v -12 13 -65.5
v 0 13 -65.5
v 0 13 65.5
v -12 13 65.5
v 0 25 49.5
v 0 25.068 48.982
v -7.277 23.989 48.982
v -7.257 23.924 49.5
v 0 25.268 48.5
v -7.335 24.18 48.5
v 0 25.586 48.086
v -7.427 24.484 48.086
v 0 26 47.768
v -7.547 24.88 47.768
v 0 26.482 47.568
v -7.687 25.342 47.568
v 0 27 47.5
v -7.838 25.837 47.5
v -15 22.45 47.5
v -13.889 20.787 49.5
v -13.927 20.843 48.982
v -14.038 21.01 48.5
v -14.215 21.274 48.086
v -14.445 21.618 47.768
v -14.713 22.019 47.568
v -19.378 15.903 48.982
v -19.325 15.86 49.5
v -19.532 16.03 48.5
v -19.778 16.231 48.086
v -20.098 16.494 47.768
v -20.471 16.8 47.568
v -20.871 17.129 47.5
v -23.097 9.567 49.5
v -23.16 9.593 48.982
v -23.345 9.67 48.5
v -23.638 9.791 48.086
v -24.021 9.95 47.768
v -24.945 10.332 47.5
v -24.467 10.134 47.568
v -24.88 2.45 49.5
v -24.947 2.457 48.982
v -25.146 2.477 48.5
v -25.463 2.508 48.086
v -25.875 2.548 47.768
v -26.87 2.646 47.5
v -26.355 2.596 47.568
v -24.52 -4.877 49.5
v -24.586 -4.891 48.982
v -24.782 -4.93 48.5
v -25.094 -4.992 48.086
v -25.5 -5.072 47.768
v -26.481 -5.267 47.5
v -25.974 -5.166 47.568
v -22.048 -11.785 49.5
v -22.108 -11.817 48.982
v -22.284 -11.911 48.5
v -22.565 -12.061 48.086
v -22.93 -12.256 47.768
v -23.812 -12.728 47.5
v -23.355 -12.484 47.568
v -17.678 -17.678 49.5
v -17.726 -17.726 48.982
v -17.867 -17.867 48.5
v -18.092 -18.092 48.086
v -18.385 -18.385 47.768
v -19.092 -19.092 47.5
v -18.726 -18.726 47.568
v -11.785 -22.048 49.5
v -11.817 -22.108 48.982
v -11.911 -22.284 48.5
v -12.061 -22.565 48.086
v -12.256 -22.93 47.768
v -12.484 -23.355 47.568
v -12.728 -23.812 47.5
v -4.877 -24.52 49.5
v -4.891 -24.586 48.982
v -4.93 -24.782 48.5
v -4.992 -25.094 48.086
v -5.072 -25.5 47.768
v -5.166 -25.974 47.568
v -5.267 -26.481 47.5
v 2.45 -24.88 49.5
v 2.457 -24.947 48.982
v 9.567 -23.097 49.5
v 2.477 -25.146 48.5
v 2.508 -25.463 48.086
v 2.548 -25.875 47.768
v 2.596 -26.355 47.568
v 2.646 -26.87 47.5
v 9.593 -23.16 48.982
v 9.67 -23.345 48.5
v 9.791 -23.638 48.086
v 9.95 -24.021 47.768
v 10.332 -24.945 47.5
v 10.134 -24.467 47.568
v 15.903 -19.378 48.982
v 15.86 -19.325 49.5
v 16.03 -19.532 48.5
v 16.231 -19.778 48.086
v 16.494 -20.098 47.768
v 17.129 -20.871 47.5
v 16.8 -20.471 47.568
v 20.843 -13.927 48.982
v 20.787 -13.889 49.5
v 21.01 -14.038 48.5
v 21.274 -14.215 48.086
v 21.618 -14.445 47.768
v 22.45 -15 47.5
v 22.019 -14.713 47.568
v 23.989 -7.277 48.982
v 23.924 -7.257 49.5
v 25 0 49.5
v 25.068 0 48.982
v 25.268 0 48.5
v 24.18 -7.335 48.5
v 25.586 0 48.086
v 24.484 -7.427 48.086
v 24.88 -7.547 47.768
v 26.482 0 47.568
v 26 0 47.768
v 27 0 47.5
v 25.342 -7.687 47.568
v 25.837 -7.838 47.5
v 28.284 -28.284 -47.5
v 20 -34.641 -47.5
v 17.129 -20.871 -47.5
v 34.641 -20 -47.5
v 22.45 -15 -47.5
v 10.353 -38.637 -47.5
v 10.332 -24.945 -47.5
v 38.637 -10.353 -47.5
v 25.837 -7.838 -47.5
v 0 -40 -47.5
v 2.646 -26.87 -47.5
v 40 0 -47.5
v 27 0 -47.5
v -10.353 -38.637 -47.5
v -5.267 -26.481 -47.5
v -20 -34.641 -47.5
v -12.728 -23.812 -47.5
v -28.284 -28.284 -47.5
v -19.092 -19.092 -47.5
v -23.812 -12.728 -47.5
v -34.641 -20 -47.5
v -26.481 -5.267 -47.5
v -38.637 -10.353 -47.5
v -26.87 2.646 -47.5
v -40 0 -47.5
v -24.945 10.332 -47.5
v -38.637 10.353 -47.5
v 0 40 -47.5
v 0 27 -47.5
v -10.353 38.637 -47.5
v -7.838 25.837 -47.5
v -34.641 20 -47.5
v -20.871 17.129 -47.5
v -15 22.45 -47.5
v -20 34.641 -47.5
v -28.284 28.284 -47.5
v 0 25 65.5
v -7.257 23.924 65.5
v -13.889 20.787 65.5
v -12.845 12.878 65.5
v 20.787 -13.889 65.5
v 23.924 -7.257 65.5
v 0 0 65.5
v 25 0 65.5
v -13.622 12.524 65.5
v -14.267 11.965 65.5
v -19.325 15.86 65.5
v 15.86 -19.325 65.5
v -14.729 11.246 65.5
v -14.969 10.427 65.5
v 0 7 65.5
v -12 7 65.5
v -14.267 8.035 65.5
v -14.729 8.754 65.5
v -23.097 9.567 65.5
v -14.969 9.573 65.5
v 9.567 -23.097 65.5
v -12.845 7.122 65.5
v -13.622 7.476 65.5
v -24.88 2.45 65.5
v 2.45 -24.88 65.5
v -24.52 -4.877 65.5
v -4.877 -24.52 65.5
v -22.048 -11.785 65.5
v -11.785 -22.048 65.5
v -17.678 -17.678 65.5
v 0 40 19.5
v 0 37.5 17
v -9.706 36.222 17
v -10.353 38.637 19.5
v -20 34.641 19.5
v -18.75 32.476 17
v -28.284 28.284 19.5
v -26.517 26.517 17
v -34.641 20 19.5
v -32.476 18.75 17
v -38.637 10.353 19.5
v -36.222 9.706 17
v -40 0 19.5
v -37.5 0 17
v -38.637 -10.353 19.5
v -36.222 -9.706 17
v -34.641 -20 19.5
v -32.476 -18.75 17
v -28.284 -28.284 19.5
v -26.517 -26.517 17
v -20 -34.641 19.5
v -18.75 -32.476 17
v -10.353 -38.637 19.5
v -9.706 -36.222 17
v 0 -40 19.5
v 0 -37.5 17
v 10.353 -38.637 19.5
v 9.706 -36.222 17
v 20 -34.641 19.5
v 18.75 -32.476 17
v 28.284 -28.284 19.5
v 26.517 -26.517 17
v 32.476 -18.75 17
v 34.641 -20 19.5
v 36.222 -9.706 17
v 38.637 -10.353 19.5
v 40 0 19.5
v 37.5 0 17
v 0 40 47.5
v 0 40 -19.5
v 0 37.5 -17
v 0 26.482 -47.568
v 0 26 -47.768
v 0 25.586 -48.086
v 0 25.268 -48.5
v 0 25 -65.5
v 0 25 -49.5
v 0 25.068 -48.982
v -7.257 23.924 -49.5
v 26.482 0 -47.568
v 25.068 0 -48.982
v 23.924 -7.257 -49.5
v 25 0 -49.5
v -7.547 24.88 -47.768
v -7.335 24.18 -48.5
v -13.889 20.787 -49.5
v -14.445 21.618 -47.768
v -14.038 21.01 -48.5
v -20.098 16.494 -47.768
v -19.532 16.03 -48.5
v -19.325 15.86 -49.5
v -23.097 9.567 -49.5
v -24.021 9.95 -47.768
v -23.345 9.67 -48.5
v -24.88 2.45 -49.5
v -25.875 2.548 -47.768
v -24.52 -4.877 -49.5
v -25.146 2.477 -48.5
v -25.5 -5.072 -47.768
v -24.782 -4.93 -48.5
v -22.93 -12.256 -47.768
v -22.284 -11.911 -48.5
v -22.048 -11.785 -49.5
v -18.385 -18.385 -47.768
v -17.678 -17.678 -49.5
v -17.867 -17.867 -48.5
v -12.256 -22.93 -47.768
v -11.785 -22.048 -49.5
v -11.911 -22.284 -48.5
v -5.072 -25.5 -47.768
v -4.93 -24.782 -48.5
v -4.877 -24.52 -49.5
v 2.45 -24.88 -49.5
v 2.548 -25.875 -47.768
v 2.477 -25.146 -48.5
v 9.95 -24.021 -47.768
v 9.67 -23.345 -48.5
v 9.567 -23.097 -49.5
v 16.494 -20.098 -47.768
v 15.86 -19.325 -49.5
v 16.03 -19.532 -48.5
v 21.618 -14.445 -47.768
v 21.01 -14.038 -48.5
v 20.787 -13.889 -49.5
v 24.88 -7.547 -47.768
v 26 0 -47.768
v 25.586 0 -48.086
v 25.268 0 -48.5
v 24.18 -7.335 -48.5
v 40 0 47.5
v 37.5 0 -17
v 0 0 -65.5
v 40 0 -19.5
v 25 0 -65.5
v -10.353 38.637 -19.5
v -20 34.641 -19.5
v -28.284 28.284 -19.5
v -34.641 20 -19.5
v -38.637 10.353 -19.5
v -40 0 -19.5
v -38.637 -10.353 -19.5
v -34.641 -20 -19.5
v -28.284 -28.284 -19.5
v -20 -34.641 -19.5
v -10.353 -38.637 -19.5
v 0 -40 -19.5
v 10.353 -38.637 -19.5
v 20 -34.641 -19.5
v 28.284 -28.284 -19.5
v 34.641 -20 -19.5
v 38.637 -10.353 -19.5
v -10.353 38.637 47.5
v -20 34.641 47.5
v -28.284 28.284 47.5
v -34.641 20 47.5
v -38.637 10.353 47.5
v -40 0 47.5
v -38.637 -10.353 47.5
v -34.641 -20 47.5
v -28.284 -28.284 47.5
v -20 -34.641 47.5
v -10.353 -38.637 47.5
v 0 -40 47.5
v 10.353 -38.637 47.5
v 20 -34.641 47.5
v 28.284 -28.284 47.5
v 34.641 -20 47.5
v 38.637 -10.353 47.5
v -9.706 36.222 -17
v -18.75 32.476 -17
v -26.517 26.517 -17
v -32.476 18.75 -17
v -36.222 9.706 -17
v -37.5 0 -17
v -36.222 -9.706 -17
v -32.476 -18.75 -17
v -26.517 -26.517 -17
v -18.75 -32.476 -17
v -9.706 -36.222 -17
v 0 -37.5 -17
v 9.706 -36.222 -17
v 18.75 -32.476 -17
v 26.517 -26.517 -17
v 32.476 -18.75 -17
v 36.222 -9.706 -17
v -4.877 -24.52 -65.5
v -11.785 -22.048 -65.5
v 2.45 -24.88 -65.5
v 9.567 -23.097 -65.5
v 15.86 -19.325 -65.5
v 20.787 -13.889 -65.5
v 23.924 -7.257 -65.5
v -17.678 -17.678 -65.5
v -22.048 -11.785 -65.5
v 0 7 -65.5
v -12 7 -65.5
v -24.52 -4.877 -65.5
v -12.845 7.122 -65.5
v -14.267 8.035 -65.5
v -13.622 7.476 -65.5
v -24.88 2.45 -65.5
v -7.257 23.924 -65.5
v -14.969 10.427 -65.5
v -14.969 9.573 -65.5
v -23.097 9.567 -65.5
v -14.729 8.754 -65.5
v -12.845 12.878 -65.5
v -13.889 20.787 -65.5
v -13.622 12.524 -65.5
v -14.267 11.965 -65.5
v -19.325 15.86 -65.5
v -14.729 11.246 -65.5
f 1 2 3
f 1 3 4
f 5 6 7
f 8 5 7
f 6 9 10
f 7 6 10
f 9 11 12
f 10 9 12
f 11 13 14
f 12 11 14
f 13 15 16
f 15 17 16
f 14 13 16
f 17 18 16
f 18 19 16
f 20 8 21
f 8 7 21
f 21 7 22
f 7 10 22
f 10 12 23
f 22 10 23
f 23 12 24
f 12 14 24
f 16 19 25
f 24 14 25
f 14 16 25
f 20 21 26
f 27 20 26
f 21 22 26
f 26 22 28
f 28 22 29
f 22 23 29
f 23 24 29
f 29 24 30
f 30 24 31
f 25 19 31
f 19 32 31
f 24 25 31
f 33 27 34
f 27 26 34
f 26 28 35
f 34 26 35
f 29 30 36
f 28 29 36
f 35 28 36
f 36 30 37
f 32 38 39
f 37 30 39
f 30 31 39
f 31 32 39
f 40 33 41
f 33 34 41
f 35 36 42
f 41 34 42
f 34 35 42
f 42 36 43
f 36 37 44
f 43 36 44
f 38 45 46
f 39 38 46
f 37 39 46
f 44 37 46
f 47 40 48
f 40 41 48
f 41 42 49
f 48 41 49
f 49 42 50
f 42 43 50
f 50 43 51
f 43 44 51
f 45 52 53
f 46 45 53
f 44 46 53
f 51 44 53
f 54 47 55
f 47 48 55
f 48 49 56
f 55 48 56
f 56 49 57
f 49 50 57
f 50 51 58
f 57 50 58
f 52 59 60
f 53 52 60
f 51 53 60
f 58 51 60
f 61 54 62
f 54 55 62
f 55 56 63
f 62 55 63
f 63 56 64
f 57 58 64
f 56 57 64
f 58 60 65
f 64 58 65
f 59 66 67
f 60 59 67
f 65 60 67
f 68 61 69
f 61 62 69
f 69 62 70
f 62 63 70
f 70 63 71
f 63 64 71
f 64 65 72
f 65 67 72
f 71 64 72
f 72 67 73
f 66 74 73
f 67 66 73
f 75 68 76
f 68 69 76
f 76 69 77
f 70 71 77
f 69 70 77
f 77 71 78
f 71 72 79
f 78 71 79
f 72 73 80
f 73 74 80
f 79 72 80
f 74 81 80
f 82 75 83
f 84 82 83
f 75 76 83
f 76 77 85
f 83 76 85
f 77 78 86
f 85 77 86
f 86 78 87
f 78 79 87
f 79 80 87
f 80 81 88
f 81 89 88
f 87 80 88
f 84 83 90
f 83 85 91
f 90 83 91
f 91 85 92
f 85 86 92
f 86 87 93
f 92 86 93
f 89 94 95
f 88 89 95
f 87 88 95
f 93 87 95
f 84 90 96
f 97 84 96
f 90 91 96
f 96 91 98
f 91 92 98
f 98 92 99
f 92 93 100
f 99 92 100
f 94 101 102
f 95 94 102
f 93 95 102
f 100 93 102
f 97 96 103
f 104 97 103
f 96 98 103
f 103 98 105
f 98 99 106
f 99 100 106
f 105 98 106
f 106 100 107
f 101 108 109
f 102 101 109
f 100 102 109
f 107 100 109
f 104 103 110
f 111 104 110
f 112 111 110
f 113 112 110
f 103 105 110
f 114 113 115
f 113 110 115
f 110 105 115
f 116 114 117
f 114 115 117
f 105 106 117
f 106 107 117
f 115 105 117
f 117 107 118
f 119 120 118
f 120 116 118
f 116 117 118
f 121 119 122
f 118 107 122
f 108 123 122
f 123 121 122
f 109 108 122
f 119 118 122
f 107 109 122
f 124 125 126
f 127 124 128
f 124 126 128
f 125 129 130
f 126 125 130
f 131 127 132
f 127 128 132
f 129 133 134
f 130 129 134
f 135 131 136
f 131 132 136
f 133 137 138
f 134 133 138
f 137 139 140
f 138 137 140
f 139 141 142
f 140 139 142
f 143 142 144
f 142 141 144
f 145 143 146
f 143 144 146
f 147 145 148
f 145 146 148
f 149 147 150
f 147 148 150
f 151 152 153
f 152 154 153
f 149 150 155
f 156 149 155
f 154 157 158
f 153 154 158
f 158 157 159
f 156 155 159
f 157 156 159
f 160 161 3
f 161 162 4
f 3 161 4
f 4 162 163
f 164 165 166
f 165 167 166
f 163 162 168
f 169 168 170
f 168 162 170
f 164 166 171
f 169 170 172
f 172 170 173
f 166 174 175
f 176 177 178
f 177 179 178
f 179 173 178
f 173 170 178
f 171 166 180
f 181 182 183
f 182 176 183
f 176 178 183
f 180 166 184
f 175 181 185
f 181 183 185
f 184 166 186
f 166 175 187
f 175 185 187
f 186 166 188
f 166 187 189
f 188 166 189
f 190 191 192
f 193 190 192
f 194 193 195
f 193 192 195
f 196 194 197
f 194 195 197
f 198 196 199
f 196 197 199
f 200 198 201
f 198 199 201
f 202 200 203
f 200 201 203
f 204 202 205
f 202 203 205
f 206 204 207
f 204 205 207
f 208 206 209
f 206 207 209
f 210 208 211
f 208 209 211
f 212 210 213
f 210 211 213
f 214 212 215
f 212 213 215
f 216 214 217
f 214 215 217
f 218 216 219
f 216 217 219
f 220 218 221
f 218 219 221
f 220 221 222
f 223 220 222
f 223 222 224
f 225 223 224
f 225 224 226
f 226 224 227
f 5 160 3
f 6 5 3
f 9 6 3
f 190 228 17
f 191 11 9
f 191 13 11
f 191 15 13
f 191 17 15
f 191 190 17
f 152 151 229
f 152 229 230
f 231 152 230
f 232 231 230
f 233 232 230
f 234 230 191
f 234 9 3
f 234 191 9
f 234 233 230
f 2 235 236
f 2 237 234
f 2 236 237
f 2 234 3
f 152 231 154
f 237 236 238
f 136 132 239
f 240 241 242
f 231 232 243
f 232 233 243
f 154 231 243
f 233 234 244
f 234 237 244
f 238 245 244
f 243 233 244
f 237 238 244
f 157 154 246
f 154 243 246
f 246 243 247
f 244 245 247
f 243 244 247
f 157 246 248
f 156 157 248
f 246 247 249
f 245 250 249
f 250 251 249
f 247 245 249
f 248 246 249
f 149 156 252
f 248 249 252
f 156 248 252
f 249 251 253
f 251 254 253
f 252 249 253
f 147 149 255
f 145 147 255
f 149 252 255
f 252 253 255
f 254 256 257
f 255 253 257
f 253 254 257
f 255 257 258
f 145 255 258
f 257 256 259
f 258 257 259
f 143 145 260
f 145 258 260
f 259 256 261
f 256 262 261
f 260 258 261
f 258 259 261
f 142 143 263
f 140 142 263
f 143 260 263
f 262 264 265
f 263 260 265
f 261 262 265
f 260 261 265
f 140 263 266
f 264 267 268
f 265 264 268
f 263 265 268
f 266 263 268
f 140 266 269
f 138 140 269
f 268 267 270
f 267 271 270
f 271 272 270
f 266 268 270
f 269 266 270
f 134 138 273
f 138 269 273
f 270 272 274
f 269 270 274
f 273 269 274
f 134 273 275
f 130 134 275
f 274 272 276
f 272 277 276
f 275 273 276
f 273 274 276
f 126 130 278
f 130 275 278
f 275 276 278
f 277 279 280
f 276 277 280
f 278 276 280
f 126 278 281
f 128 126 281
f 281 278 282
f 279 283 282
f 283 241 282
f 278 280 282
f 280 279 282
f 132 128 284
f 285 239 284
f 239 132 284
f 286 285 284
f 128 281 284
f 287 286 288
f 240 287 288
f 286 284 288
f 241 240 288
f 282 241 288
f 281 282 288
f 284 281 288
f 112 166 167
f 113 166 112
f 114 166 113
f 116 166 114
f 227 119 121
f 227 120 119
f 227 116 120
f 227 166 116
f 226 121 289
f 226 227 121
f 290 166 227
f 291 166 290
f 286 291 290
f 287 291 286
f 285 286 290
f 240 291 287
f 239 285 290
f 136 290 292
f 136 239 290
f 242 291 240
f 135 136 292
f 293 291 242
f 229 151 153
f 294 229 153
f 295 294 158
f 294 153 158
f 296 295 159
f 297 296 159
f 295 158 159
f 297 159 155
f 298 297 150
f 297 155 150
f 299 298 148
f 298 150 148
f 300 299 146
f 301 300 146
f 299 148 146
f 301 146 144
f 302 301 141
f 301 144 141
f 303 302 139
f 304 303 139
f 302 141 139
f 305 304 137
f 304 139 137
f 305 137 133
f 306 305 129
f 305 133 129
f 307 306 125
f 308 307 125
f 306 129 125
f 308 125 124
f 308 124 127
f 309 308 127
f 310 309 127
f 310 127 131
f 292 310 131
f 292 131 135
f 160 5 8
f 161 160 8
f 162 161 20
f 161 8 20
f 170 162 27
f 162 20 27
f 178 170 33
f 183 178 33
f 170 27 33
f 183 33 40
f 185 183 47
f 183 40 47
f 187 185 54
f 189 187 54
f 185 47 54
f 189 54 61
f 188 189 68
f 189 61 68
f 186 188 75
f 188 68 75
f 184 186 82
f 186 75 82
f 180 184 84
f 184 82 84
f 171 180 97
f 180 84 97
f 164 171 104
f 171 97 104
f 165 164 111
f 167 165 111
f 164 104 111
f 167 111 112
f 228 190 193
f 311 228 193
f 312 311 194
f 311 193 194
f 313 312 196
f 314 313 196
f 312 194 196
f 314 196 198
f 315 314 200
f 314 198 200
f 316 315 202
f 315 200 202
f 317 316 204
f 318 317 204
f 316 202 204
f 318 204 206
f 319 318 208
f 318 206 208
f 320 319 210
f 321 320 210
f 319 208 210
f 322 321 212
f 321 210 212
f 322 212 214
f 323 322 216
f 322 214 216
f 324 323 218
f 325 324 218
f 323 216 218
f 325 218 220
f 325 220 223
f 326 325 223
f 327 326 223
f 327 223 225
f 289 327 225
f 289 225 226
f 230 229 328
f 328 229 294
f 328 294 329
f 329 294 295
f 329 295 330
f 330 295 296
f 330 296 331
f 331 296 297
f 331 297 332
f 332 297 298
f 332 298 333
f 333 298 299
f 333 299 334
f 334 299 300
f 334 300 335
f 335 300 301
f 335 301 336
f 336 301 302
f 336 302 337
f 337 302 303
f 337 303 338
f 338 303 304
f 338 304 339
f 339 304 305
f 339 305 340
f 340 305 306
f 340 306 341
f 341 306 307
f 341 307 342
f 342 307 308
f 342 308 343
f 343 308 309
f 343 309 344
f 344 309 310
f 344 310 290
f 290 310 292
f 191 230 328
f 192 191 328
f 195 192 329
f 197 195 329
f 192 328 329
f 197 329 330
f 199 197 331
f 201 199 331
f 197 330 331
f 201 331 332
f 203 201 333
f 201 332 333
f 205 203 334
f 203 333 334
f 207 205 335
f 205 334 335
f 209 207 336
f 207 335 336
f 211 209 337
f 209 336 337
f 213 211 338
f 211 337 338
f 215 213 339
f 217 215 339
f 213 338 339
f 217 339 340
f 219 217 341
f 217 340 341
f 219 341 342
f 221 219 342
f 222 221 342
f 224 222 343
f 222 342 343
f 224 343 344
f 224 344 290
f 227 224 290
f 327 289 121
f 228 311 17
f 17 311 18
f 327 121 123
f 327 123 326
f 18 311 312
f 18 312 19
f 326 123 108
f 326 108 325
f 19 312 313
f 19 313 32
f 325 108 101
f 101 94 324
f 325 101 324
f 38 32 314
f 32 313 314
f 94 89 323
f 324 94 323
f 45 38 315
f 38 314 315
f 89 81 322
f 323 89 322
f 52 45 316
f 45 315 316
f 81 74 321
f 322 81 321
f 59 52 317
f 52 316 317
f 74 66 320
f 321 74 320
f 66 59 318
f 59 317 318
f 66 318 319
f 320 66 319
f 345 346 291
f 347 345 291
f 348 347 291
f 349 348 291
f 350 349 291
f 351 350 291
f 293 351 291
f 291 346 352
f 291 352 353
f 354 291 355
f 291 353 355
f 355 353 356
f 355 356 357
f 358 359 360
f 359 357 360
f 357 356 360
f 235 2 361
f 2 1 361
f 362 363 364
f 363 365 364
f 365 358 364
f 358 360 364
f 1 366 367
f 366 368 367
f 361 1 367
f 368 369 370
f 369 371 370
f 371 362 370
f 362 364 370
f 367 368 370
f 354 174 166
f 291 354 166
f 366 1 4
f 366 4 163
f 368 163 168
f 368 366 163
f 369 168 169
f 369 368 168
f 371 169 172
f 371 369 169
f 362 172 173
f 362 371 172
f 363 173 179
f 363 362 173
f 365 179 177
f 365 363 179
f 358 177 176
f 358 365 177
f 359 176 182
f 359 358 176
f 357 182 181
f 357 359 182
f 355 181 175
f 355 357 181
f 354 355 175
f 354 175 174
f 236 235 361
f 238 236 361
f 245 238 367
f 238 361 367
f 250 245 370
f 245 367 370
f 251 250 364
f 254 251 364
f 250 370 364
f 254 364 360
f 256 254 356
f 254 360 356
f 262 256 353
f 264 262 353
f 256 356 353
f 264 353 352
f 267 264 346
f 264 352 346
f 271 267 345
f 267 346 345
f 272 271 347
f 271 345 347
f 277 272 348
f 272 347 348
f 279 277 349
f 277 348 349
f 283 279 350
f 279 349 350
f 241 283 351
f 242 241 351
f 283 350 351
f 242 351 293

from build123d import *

# Parameters (mm, degrees)
CUT_EXTRUDE1_DEPTH      = 66.5
CUT_EXTRUDE1_DEPTH_BACK = 66.5


with BuildPart() as part:
    # Sketch1 → Revolve1 (revolve)
    with BuildSketch(Plane(origin=(0, 0, 0), x_dir=(0, 0, -1), z_dir=(1, 0, 0))):
        with BuildLine():
            Line((65.5, 0), (-65.5, 0))
            Line((-65.5, 0), (-65.5, 25))
            Line((-65.5, 25), (-49.5, 25))
            ThreePointArc((-49.5, 25), (-48.085786438, 25.585786438), (-47.5, 27))
            Line((-47.5, 27), (-47.5, 40))
            Line((-47.5, 40), (-19.5, 40))
            Line((-19.5, 40), (-17, 37.5))
            Line((-17, 37.5), (17, 37.5))
            Line((17, 37.5), (19.5, 40))
            Line((19.5, 40), (47.5, 40))
            Line((47.5, 40), (47.5, 27))
            ThreePointArc((47.5, 27), (48.085786438, 25.585786438), (49.5, 25))
            Line((49.5, 25), (65.5, 25))
            Line((65.5, 25), (65.5, 0))
        make_face()
    revolve(axis=Axis((0, 0, -65.5), (0, 0, 1)))

    # Sketch2 → Cut-Extrude1 (cut, two sides)
    with BuildSketch(Plane.XY) as cut_extrude1_sk:
        with BuildLine():
            Line((0, 40), (0, 13))
            Line((0, 13), (-12, 13))
            ThreePointArc((-12, 13), (-15, 10), (-12, 7))
            Line((-12, 7), (0, 7))
            Line((0, 7), (0, 0))
            Line((0, 0), (40, 0))
            ThreePointArc((40, 0), (28.284271247, 28.284271247), (0, 40))
        make_face()
    extrude(amount=CUT_EXTRUDE1_DEPTH, mode=Mode.SUBTRACT)
    extrude(cut_extrude1_sk.sketch, amount=-CUT_EXTRUDE1_DEPTH_BACK, mode=Mode.SUBTRACT)


solid = part.part
